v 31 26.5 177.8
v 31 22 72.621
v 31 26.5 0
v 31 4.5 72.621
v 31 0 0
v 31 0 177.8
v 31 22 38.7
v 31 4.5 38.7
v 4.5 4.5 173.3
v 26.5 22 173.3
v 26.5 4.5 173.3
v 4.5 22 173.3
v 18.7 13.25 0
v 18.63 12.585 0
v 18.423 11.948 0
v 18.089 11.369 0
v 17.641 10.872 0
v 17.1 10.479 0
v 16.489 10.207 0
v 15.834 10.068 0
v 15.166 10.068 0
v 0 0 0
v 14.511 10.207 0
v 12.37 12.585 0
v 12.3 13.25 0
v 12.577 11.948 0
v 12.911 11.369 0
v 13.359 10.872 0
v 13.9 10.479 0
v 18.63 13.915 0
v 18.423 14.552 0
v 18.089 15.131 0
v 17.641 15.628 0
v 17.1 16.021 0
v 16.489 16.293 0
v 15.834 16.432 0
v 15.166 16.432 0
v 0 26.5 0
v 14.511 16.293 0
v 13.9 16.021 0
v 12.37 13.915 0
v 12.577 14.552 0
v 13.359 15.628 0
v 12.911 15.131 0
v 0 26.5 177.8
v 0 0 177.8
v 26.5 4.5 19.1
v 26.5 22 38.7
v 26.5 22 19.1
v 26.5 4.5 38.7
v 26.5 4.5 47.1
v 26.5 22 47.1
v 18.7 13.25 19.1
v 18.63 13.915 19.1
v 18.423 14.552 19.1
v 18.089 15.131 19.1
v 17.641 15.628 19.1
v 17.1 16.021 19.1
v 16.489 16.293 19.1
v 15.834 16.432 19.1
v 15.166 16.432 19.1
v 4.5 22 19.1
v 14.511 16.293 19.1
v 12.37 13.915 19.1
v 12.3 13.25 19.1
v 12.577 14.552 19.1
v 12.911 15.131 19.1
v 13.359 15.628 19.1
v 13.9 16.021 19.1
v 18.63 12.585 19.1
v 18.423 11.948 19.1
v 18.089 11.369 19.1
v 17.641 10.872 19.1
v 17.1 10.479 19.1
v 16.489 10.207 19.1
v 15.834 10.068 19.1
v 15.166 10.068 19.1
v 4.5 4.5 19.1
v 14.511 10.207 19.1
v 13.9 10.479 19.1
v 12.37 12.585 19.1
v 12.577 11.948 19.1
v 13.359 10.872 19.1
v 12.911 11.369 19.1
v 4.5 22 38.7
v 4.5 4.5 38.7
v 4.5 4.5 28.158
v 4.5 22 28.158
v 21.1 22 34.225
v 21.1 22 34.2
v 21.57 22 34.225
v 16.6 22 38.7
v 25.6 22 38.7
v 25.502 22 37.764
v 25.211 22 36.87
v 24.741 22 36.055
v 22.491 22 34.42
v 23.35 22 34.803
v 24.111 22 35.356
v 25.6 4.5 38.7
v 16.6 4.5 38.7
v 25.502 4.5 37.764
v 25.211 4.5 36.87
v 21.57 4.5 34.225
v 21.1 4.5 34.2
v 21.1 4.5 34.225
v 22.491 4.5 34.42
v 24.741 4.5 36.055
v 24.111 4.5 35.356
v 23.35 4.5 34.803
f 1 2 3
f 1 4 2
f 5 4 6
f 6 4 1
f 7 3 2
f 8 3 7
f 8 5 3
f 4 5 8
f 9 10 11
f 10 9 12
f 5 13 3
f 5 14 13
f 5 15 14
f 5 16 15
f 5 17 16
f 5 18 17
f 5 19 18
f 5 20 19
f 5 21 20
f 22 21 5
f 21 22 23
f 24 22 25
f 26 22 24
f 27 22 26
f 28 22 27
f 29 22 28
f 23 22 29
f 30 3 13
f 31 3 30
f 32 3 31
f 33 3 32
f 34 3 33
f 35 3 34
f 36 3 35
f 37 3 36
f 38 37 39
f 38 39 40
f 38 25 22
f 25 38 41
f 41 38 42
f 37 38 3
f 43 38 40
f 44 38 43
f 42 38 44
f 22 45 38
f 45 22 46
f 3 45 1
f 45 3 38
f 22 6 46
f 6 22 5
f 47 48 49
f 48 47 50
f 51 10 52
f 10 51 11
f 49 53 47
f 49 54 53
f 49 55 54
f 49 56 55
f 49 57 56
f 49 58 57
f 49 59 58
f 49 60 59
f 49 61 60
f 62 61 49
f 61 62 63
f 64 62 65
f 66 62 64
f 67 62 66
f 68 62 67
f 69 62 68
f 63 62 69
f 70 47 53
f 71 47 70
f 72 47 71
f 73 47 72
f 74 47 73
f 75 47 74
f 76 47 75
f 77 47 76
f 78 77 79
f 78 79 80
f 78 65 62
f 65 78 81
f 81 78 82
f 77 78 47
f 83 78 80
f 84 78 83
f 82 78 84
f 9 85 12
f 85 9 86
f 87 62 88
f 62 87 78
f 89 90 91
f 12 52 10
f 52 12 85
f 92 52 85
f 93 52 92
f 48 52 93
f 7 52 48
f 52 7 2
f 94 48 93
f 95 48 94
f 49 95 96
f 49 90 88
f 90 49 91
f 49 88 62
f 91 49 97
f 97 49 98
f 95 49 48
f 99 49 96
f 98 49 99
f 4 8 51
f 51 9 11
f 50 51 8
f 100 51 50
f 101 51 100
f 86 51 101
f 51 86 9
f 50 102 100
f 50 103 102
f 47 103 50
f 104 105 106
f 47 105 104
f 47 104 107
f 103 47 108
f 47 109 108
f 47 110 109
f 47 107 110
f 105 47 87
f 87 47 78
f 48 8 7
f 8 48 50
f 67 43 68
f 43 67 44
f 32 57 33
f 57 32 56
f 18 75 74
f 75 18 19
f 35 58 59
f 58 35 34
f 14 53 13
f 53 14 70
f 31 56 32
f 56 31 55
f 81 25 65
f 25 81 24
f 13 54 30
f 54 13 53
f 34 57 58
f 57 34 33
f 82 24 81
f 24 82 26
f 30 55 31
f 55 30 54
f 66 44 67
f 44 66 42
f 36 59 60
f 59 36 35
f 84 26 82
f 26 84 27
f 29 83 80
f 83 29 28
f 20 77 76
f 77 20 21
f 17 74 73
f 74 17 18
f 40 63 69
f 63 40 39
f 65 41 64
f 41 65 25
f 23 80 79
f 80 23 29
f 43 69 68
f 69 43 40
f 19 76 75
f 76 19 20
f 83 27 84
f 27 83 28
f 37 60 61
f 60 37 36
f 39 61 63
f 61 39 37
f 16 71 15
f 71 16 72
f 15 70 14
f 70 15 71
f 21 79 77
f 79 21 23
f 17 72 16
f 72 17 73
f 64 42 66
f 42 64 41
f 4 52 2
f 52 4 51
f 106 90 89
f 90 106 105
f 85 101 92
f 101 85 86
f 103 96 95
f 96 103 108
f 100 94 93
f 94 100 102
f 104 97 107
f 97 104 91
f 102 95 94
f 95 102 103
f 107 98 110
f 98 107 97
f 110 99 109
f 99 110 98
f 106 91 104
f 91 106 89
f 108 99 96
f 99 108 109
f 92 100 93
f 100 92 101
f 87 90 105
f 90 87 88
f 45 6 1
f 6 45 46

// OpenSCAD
wall_thickness=4.5; //[0: 0.1 :10]
cap_height=38.7; //[0: 0.1 :100]
bottom_thickness=19.1; //[0: 0.1 :50]
windsheet_thickness=0.9; //[0: 0.1 :5]
mouth_height=8.4; //[0: 0.1 :50]
pipe_size=6.4;  //[0: 0.1 :20]
internal_width=17.5; //[0: 0.1 :100]
internal_depth=22.0; //[0: 0.1 :100]
internal_height=134.6; //[0: 0.1 :1000]
mouth_angle=10;  //[0: 0.1 :90]
windsheet_angle=20;  //[0: 0.1 :50]
capped="Yes"; //[Yes, No]

module pipe(wall_thickness, cap_height, bottom_thickness, windsheet_thickness, mouth_height, pipe_size, internal_width, internal_depth, internal_height, mouth_angle, windsheet_angle,capped);
    
    difference(){
        cube([(internal_depth+(2*wall_thickness)), (internal_width+(2*wall_thickness)), (internal_height+cap_height)]);
        translate([wall_thickness, wall_thickness, bottom_thickness]){
            cube([internal_depth, internal_width, (internal_height+cap_height-bottom_thickness+1)]);
        }
        translate([wall_thickness, wall_thickness, cap_height]){
            cube([(internal_depth+wall_thickness+1), internal_width, mouth_height]);
        }
        translate([((internal_depth+(2*wall_thickness))/2), ((internal_width+(2*wall_thickness))/2), -1]){
            cylinder(h=bottom_thickness+2, d=pipe_size, $fn=30);
        }
    translate([(internal_depth+wall_thickness), wall_thickness, (cap_height+mouth_height)]){
        rotate([0, mouth_angle, 0]){
            cube([wall_thickness, internal_width, internal_height]);
            }
        }
    }
    
    difference(){
        union(){
            translate([wall_thickness, wall_thickness, bottom_thickness]){
                cube([(internal_depth-windsheet_thickness-wall_thickness), internal_width, (cap_height-bottom_thickness)]);
            }
            translate([(internal_depth-windsheet_thickness), wall_thickness, cap_height]){
                rotate(a=-90, v=[1, 0, 0]){
                    cylinder(h=internal_width, r=wall_thickness, $fn=30);
                }
            }
        }
        translate([(internal_depth-wall_thickness-windsheet_thickness), wall_thickness-1, cap_height]){
            cube([(2*wall_thickness), internal_width+2, mouth_height]);
        }
        translate([(internal_depth-windsheet_thickness), wall_thickness-1, (cap_height-wall_thickness)]){
            rotate(a=-windsheet_angle-180, v=[0, 1, 0]){
                cube([internal_depth, internal_width+2, cap_height]);
            }
        }
    }
    
    if(capped=="Yes"){
        translate([0, 0, (internal_height+cap_height)]){
            cube([(internal_depth+(2*wall_thickness)), (internal_width+(2*wall_thickness)), wall_thickness]);
        }
    }
